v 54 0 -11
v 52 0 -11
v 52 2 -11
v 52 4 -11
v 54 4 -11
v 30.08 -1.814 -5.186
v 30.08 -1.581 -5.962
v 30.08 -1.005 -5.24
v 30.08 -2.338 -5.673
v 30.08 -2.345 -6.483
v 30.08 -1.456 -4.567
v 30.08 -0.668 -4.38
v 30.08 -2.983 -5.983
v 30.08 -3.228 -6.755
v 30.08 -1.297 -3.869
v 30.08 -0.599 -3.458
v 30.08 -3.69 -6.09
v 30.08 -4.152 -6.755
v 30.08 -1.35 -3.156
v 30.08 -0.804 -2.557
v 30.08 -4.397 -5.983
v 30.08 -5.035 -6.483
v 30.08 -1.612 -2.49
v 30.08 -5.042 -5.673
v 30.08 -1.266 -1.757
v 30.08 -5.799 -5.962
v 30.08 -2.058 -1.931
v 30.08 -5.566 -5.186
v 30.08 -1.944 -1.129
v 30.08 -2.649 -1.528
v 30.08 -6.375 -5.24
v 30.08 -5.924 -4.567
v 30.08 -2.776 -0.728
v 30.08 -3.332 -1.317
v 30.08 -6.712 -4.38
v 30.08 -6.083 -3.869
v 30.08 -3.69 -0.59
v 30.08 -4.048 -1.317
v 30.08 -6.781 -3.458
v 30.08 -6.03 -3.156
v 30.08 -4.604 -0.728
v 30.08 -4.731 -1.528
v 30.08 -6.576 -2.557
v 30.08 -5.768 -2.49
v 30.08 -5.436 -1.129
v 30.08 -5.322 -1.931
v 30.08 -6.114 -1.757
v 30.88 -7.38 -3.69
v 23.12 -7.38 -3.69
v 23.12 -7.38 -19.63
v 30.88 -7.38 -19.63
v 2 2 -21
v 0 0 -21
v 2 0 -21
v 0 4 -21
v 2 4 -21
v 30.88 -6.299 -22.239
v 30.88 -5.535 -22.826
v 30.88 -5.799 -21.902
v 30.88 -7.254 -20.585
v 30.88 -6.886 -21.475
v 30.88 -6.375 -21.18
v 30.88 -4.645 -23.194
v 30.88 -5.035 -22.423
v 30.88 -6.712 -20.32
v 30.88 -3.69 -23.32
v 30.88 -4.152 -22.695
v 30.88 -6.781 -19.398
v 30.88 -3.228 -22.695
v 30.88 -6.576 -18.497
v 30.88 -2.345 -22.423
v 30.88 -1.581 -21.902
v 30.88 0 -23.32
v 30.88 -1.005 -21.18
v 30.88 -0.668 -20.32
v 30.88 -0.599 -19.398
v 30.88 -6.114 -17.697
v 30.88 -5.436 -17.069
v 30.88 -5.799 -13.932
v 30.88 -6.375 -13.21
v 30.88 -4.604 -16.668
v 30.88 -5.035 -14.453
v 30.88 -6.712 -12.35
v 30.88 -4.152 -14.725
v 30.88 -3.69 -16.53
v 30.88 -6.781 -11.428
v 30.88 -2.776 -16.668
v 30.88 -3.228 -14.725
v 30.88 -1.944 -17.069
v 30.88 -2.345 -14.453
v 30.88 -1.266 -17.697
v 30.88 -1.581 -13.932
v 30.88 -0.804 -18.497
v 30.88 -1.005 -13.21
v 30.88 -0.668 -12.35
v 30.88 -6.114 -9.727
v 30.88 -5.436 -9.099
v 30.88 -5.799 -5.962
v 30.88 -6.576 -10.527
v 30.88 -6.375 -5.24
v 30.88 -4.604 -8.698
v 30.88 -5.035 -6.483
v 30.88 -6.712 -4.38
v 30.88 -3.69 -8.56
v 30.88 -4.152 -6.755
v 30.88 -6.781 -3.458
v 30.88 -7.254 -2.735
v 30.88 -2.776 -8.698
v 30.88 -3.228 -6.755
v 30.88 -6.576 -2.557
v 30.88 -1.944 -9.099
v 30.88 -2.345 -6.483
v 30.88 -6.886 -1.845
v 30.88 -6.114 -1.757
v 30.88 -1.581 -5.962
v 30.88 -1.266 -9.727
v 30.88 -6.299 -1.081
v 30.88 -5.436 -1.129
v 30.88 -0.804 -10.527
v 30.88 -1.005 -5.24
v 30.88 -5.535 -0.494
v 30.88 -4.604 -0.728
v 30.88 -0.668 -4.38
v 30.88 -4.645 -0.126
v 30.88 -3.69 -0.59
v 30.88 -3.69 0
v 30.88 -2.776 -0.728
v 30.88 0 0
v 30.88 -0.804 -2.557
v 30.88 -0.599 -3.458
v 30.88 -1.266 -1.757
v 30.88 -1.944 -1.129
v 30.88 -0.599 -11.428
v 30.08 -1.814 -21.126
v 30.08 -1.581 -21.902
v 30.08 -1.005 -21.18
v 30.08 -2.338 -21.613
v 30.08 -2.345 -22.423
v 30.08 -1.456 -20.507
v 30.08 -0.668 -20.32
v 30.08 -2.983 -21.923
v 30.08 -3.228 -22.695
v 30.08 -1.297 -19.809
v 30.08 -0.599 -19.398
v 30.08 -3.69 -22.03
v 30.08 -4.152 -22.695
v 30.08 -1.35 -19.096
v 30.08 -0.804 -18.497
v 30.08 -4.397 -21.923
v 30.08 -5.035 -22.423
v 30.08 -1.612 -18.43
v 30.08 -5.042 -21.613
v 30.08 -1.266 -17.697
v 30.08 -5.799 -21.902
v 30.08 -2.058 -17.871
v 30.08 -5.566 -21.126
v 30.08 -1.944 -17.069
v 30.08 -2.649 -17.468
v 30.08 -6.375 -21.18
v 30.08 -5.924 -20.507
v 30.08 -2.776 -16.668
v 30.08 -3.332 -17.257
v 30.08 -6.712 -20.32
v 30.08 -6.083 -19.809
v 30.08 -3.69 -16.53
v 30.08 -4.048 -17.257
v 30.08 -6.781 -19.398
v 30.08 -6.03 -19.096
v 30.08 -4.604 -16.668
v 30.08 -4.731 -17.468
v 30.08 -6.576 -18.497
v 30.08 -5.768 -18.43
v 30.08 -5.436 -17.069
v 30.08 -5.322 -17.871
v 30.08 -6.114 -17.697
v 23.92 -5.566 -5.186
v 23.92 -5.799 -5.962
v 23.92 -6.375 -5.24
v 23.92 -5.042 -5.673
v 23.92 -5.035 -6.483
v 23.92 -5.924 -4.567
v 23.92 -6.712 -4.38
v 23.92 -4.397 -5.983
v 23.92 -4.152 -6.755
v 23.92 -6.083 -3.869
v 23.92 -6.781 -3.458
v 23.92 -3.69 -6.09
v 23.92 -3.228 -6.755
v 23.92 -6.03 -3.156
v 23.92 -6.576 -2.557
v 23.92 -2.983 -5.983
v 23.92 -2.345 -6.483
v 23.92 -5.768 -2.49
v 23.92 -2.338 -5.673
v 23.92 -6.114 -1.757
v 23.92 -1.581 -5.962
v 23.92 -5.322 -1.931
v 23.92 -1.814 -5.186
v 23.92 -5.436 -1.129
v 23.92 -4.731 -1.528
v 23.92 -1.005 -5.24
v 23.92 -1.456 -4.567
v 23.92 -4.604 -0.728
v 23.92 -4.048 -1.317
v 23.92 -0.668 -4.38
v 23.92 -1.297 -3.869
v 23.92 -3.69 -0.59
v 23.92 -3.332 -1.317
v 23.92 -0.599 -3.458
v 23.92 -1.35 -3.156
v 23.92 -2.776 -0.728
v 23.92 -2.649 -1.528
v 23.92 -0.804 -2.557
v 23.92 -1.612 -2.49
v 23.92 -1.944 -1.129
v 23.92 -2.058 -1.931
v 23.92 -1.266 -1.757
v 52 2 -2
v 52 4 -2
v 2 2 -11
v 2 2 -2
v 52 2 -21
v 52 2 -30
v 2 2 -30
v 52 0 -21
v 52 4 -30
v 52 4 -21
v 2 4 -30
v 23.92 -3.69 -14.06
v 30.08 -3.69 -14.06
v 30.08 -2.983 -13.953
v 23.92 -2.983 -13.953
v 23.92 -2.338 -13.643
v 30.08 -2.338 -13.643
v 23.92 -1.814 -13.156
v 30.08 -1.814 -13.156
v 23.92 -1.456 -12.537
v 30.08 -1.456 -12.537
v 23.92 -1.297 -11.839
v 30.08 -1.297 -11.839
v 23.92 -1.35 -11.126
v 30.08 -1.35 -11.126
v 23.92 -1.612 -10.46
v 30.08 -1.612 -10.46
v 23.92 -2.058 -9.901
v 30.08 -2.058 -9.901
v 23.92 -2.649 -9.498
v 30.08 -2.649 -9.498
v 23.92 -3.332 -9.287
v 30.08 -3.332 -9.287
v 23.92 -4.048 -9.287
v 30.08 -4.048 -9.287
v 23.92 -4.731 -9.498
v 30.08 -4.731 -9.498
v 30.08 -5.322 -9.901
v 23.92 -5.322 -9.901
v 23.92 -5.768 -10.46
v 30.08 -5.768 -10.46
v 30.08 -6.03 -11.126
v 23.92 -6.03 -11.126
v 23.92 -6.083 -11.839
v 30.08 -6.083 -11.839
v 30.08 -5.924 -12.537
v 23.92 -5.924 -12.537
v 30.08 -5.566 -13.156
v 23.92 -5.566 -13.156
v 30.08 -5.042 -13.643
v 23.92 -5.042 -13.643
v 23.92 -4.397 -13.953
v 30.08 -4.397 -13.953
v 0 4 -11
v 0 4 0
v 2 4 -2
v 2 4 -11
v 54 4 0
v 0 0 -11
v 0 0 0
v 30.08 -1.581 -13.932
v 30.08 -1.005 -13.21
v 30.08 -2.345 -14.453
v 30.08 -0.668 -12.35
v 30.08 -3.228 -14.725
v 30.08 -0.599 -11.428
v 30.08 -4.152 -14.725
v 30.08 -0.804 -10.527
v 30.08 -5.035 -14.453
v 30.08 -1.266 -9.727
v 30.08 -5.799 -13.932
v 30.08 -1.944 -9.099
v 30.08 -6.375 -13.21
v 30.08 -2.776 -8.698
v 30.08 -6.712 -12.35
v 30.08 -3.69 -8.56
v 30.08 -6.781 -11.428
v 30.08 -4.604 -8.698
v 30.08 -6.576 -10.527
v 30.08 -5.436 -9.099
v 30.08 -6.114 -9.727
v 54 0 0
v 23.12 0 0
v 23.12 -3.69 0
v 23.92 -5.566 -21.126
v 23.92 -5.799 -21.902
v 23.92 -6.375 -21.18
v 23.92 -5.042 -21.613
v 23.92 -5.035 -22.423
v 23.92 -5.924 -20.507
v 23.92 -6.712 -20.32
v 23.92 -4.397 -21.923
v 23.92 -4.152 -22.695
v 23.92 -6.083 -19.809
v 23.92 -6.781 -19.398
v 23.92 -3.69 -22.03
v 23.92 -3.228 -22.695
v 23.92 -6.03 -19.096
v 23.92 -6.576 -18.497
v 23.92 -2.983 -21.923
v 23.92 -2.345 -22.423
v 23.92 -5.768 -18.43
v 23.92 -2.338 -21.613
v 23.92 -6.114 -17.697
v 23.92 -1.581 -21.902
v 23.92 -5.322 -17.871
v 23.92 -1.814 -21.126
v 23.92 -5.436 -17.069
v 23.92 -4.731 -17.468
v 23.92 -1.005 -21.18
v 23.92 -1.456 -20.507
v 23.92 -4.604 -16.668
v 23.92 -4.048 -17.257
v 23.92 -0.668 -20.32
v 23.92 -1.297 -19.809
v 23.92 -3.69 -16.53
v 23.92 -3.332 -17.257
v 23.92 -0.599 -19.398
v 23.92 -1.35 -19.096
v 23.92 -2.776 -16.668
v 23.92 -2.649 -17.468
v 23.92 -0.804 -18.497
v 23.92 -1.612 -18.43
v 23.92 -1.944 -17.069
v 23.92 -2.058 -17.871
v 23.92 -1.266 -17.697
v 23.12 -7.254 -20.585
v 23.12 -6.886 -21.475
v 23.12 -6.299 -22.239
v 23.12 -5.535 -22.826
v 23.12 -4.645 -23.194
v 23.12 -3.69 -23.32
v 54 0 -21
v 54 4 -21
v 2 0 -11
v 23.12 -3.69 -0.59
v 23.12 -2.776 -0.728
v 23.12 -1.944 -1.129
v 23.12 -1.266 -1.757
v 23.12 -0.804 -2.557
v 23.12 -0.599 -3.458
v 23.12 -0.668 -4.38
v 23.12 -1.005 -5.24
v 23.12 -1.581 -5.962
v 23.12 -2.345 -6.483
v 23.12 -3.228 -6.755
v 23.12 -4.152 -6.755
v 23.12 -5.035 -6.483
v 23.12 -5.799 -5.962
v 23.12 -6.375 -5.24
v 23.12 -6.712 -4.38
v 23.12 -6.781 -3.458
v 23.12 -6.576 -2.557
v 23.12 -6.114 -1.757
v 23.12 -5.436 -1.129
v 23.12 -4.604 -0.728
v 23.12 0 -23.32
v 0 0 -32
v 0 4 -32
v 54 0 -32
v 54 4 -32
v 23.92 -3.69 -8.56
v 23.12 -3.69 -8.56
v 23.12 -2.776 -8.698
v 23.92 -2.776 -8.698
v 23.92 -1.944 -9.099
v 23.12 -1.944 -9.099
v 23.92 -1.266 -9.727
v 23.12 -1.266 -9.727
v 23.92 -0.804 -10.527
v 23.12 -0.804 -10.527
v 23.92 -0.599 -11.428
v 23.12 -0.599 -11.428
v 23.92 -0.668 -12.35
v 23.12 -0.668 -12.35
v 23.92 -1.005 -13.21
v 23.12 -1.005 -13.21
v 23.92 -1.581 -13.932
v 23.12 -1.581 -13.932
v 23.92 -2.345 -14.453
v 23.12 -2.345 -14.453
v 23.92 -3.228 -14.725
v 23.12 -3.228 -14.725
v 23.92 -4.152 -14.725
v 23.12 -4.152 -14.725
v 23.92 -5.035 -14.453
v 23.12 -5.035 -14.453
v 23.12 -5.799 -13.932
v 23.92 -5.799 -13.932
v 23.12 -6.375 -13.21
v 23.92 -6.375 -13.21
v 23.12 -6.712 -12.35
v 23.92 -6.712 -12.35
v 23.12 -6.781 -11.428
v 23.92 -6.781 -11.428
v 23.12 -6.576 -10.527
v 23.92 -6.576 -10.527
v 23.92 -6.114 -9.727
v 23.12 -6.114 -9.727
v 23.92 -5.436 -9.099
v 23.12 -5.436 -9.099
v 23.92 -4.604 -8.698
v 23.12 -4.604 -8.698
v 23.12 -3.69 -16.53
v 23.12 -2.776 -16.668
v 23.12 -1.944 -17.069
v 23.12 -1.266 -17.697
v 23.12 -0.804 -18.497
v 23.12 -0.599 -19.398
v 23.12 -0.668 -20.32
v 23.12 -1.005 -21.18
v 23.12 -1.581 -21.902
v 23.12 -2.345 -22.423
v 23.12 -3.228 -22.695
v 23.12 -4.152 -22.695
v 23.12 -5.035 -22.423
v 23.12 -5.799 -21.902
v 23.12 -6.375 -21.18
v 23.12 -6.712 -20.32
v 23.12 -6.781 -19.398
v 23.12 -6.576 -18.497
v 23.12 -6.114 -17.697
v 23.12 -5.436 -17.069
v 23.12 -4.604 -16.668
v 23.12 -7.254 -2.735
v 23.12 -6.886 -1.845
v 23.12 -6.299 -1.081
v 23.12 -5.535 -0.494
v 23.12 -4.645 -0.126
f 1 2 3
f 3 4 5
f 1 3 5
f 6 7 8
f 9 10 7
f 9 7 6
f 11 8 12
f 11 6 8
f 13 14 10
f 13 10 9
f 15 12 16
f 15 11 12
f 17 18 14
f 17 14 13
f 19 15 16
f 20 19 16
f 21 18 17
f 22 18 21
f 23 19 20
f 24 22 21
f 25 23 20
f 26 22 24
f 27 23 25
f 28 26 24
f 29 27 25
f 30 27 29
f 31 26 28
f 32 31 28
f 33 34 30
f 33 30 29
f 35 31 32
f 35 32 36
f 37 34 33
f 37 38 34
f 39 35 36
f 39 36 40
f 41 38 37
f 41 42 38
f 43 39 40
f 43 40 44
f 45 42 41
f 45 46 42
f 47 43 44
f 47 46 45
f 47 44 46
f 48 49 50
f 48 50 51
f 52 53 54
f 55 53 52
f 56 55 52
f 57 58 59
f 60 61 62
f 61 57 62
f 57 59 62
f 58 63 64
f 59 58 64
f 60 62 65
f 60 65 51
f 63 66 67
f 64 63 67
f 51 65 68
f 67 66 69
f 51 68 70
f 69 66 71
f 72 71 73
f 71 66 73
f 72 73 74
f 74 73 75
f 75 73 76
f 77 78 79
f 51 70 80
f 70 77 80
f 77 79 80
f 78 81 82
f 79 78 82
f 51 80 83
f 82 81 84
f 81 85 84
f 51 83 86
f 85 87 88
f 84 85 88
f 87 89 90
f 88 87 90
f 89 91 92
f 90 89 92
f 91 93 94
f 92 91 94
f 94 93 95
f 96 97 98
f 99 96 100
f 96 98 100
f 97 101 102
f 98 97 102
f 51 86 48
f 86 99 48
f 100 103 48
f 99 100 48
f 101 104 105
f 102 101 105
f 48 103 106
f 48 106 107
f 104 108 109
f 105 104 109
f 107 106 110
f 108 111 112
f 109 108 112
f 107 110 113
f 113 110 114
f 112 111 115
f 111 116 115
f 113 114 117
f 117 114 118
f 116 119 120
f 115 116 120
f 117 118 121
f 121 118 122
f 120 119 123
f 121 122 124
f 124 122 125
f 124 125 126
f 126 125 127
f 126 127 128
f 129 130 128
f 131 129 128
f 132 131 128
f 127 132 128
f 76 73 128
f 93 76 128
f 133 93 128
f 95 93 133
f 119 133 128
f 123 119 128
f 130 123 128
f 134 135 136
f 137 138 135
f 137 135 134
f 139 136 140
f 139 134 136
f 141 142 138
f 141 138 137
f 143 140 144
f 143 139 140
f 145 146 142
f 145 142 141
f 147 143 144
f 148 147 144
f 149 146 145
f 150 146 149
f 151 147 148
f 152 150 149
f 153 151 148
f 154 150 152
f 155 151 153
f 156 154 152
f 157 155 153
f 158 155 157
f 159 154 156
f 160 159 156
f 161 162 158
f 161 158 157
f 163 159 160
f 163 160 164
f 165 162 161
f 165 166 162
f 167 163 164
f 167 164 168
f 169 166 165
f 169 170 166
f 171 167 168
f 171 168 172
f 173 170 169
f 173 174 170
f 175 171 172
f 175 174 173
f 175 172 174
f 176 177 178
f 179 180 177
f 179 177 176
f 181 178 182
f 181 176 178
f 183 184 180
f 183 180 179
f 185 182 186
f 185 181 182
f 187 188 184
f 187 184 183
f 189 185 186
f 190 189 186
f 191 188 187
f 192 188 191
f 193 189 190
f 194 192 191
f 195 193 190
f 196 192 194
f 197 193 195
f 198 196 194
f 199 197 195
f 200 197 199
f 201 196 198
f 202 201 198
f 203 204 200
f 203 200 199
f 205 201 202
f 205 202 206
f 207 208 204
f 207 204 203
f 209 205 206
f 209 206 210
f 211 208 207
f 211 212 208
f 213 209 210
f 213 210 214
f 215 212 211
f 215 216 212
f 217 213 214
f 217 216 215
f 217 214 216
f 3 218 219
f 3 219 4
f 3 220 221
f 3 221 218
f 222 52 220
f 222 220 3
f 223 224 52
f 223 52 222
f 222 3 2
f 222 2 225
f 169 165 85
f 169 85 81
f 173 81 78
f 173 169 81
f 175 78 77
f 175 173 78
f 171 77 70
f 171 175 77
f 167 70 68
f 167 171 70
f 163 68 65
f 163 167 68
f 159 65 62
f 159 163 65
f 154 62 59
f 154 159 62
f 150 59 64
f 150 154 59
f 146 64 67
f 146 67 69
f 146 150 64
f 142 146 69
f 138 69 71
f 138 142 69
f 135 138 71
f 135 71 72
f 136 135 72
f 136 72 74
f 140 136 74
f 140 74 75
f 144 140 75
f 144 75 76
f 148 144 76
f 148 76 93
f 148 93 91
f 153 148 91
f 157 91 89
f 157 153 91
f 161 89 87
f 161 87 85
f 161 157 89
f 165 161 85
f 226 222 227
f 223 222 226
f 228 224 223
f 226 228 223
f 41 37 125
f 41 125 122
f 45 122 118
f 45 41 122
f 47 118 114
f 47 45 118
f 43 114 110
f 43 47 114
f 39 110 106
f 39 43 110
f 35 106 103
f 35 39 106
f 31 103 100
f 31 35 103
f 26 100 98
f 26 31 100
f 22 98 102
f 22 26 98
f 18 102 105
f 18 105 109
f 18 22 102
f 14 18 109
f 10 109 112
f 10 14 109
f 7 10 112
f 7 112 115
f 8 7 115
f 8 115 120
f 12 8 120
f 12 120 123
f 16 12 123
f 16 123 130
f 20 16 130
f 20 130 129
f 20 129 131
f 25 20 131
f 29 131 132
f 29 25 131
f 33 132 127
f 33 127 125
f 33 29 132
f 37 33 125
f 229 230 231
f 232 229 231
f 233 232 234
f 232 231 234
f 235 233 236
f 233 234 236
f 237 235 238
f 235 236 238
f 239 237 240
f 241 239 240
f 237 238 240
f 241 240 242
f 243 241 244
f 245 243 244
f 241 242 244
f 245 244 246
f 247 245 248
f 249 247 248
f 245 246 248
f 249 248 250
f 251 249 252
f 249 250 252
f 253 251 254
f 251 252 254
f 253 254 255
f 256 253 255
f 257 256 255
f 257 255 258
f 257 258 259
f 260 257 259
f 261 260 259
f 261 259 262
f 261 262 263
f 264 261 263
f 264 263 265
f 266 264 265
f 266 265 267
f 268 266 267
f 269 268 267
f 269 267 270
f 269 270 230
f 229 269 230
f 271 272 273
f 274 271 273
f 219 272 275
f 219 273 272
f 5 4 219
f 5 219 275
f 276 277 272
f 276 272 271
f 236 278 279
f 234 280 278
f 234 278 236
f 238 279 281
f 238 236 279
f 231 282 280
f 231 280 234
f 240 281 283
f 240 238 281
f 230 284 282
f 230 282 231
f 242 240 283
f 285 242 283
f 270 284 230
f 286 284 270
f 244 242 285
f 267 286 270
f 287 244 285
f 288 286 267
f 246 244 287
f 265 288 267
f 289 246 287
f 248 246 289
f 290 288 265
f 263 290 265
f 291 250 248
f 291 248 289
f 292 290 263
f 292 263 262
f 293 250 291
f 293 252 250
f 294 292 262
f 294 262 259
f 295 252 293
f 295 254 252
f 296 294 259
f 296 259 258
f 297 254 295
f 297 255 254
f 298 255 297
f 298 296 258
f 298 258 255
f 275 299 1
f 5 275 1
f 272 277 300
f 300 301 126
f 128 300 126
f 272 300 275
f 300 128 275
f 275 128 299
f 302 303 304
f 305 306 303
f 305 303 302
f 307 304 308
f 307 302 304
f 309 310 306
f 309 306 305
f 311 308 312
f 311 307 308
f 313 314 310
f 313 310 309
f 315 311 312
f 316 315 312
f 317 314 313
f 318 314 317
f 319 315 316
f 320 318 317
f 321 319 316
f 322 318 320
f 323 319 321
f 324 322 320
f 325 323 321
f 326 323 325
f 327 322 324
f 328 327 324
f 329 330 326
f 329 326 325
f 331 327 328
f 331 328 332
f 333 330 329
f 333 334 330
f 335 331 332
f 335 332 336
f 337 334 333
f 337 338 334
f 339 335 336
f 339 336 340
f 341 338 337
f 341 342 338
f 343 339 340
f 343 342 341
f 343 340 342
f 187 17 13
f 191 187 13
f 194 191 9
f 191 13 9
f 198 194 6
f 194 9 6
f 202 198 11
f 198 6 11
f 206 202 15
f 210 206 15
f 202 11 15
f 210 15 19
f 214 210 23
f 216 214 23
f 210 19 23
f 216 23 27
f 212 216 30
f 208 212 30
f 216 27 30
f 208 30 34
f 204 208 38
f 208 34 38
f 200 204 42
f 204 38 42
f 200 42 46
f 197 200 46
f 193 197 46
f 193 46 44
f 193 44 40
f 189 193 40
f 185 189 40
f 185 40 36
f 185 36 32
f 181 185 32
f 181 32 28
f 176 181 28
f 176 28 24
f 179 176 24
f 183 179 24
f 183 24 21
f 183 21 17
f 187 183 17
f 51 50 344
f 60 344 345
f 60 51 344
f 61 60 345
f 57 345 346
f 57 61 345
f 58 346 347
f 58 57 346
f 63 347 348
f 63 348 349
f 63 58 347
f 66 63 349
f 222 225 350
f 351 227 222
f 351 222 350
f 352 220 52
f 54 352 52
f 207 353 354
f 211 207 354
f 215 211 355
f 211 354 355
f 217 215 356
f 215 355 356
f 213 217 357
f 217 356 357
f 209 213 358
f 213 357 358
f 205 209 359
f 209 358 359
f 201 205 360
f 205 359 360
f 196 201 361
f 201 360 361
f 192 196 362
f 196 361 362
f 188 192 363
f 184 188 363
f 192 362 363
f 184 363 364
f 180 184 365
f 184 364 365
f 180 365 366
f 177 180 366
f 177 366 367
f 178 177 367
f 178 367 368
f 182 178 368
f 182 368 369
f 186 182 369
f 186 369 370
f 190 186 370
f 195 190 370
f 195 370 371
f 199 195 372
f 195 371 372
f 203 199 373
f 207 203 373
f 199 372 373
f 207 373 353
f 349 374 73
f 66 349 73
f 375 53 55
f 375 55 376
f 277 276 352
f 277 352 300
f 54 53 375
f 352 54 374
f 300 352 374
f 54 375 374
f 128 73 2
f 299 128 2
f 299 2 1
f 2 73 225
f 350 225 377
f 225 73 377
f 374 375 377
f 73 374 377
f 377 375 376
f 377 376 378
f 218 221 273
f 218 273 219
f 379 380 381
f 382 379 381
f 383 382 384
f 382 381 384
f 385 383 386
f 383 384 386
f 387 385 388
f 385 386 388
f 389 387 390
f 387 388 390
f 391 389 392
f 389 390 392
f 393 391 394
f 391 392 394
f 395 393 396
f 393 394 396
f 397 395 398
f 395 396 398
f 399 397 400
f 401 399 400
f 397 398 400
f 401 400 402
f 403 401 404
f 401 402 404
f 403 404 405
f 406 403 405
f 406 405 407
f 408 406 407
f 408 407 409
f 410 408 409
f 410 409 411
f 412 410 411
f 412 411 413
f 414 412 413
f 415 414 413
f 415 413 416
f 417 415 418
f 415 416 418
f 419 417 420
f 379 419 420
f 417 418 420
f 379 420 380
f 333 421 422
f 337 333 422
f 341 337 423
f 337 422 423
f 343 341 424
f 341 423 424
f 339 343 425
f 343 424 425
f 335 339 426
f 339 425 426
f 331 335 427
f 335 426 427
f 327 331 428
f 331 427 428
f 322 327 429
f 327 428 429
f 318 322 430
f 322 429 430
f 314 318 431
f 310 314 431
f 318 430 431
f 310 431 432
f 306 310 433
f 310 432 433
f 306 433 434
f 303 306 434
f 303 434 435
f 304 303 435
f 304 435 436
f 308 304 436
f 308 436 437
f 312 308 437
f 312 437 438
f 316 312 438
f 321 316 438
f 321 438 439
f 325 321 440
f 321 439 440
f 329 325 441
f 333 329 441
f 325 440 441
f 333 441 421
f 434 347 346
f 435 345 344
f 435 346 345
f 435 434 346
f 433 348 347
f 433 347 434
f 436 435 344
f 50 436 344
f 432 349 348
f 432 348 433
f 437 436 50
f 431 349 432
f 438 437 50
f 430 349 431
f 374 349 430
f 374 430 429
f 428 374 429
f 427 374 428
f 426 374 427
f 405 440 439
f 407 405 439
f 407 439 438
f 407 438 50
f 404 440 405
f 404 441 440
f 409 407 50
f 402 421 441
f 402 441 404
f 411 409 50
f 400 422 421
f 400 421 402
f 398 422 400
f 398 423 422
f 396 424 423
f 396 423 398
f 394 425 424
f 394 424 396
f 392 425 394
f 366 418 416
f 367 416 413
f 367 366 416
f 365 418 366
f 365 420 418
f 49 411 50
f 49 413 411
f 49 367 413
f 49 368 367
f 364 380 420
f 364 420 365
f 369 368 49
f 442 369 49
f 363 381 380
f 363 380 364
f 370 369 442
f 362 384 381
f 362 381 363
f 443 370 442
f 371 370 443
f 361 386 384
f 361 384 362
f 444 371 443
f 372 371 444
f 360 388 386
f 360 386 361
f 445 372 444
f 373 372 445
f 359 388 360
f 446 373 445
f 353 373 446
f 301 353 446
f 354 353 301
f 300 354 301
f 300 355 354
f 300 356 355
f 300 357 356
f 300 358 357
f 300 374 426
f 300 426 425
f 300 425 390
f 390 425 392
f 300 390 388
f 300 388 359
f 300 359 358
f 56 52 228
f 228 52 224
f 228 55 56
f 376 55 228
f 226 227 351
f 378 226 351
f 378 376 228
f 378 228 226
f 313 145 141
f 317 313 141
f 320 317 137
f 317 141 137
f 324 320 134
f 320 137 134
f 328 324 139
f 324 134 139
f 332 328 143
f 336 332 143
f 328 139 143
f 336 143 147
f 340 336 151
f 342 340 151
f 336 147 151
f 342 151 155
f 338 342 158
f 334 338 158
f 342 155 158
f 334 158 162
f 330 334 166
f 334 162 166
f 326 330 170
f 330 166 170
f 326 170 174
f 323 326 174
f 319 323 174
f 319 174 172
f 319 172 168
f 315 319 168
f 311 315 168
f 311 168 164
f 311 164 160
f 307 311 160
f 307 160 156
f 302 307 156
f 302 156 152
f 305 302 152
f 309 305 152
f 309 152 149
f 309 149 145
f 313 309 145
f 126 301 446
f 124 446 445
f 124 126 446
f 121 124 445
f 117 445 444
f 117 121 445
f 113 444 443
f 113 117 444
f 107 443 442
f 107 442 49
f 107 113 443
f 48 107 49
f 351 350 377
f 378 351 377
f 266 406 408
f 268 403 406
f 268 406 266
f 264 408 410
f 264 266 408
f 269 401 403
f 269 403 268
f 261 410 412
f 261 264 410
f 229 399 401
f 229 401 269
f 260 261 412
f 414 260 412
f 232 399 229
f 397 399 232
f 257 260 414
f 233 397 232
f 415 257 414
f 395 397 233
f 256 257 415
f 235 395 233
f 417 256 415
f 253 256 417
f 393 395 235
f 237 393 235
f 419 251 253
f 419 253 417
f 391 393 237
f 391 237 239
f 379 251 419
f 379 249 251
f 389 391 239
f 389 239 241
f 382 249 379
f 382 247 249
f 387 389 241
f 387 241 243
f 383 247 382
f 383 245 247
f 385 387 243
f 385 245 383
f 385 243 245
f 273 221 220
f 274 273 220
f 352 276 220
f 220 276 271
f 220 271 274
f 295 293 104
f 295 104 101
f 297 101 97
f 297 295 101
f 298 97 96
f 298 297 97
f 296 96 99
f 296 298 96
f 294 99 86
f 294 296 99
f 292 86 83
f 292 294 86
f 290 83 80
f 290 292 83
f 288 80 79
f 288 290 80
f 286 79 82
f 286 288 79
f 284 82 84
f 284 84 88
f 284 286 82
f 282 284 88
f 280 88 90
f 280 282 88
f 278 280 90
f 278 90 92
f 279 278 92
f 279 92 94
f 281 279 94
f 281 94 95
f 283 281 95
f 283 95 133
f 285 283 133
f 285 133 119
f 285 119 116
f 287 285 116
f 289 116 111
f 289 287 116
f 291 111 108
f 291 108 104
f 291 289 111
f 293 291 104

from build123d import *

# Parameters (mm, degrees)
SKETCH1_W           = 54
SKETCH1_H           = 32
BOSS_EXTRUDE1_DEPTH = 2
SKETCH2_W           = 54
SKETCH2_H           = 32
SKETCH2_W_2         = 50
SKETCH2_H_2         = 28
BOSS_EXTRUDE2_DEPTH = 2
SKETCH3_W           = 2
SKETCH3_H           = 10
CUT_EXTRUDE1_DEPTH  = 4
SKETCH4_W           = 7.76
SKETCH4_H           = 23.32
BOSS_EXTRUDE3_DEPTH = 7.38
SKETCH5_R           = 2.4
CUT_EXTRUDE2_DEPTH  = 7.79
SKETCH6_R           = 3.1
CUT_EXTRUDE3_DEPTH  = 0.8
CUT_EXTRUDE4_START  = -0.8
SKETCH7_R           = 3.1
CUT_EXTRUDE4_DEPTH  = 0.8
FILLET1_R           = 3.69


with BuildPart() as part:
    # Sketch1 → Boss-Extrude1 (new body)
    with BuildSketch(Plane(origin=(0, 0, 0), x_dir=(1, 0, 0), z_dir=(0, 1, 0))):
        with Locations((27, 16)):
            Rectangle(SKETCH1_W, SKETCH1_H)
    extrude(amount=BOSS_EXTRUDE1_DEPTH)

    # Sketch2 → Boss-Extrude2 (add)
    with BuildSketch(Plane(origin=(0, 2, 0), x_dir=(1, 0, 0), z_dir=(0, 1, 0))):
        with Locations((27, 16)):
            Rectangle(SKETCH2_W, SKETCH2_H)
        with Locations((27, 16)):
            Rectangle(SKETCH2_W_2, SKETCH2_H_2, mode=Mode.SUBTRACT)
    extrude(amount=BOSS_EXTRUDE2_DEPTH)

    # Sketch3 → Cut-Extrude1 (cut)
    with BuildSketch(Plane(origin=(0, 4, 0), x_dir=(1, 0, 0), z_dir=(0, 1, 0))):
        with Locations((1, 16)):
            Rectangle(SKETCH3_W, SKETCH3_H)
        with Locations((53, 16)):
            Rectangle(SKETCH3_W, SKETCH3_H)
    extrude(amount=-CUT_EXTRUDE1_DEPTH, mode=Mode.SUBTRACT)

    # Sketch4 → Boss-Extrude3 (add)
    with BuildSketch(Plane.XZ):
        with Locations((27, -11.66)):
            Rectangle(SKETCH4_W, SKETCH4_H)
    extrude(amount=BOSS_EXTRUDE3_DEPTH)

    # Sketch5 → Cut-Extrude2 (cut)
    with BuildSketch(Plane(origin=(30.88, 0, 0), x_dir=(0, 0, -1), z_dir=(1, 0, 0))):
        with Locations((3.69, -3.69)):
            Circle(SKETCH5_R)
        with Locations((11.66, -3.69)):
            Circle(SKETCH5_R)
        with Locations((19.63, -3.69)):
            Circle(SKETCH5_R)
    extrude(amount=-CUT_EXTRUDE2_DEPTH, mode=Mode.SUBTRACT)

    # Sketch6 → Cut-Extrude3 (cut)
    with BuildSketch(Plane.ZY.offset(-23.12)):
        with Locations((-11.66, -3.69)):
            Circle(SKETCH6_R)
        with Locations((-3.69, -3.69)):
            Circle(SKETCH6_R)
        with Locations((-19.63, -3.69)):
            Circle(SKETCH6_R)
    extrude(amount=-CUT_EXTRUDE3_DEPTH, mode=Mode.SUBTRACT)

    # Sketch7 → Cut-Extrude4 (cut)
    with BuildSketch(Plane(origin=(30.88, 0, 0), x_dir=(0, 0, -1), z_dir=(1, 0, 0)).offset(CUT_EXTRUDE4_START)):
        with Locations(Location((3.69, -3.69, 0), (0, 0, 180))):
            Circle(SKETCH7_R)
        with Locations(Location((11.66, -3.69, 0), (0, 0, 180))):
            Circle(SKETCH7_R)
        with Locations(Location((19.63, -3.69, 0), (0, 0, 180))):
            Circle(SKETCH7_R)
    extrude(amount=CUT_EXTRUDE4_DEPTH, mode=Mode.SUBTRACT)

    # Fillet1
    fillet1_edges = [part.edges().sort_by_distance(p)[0] for p in [
        (27, -7.38, -23.32),
        (27, -7.38, 0),
    ]]
    fillet(fillet1_edges, radius=FILLET1_R)


solid = part.part
